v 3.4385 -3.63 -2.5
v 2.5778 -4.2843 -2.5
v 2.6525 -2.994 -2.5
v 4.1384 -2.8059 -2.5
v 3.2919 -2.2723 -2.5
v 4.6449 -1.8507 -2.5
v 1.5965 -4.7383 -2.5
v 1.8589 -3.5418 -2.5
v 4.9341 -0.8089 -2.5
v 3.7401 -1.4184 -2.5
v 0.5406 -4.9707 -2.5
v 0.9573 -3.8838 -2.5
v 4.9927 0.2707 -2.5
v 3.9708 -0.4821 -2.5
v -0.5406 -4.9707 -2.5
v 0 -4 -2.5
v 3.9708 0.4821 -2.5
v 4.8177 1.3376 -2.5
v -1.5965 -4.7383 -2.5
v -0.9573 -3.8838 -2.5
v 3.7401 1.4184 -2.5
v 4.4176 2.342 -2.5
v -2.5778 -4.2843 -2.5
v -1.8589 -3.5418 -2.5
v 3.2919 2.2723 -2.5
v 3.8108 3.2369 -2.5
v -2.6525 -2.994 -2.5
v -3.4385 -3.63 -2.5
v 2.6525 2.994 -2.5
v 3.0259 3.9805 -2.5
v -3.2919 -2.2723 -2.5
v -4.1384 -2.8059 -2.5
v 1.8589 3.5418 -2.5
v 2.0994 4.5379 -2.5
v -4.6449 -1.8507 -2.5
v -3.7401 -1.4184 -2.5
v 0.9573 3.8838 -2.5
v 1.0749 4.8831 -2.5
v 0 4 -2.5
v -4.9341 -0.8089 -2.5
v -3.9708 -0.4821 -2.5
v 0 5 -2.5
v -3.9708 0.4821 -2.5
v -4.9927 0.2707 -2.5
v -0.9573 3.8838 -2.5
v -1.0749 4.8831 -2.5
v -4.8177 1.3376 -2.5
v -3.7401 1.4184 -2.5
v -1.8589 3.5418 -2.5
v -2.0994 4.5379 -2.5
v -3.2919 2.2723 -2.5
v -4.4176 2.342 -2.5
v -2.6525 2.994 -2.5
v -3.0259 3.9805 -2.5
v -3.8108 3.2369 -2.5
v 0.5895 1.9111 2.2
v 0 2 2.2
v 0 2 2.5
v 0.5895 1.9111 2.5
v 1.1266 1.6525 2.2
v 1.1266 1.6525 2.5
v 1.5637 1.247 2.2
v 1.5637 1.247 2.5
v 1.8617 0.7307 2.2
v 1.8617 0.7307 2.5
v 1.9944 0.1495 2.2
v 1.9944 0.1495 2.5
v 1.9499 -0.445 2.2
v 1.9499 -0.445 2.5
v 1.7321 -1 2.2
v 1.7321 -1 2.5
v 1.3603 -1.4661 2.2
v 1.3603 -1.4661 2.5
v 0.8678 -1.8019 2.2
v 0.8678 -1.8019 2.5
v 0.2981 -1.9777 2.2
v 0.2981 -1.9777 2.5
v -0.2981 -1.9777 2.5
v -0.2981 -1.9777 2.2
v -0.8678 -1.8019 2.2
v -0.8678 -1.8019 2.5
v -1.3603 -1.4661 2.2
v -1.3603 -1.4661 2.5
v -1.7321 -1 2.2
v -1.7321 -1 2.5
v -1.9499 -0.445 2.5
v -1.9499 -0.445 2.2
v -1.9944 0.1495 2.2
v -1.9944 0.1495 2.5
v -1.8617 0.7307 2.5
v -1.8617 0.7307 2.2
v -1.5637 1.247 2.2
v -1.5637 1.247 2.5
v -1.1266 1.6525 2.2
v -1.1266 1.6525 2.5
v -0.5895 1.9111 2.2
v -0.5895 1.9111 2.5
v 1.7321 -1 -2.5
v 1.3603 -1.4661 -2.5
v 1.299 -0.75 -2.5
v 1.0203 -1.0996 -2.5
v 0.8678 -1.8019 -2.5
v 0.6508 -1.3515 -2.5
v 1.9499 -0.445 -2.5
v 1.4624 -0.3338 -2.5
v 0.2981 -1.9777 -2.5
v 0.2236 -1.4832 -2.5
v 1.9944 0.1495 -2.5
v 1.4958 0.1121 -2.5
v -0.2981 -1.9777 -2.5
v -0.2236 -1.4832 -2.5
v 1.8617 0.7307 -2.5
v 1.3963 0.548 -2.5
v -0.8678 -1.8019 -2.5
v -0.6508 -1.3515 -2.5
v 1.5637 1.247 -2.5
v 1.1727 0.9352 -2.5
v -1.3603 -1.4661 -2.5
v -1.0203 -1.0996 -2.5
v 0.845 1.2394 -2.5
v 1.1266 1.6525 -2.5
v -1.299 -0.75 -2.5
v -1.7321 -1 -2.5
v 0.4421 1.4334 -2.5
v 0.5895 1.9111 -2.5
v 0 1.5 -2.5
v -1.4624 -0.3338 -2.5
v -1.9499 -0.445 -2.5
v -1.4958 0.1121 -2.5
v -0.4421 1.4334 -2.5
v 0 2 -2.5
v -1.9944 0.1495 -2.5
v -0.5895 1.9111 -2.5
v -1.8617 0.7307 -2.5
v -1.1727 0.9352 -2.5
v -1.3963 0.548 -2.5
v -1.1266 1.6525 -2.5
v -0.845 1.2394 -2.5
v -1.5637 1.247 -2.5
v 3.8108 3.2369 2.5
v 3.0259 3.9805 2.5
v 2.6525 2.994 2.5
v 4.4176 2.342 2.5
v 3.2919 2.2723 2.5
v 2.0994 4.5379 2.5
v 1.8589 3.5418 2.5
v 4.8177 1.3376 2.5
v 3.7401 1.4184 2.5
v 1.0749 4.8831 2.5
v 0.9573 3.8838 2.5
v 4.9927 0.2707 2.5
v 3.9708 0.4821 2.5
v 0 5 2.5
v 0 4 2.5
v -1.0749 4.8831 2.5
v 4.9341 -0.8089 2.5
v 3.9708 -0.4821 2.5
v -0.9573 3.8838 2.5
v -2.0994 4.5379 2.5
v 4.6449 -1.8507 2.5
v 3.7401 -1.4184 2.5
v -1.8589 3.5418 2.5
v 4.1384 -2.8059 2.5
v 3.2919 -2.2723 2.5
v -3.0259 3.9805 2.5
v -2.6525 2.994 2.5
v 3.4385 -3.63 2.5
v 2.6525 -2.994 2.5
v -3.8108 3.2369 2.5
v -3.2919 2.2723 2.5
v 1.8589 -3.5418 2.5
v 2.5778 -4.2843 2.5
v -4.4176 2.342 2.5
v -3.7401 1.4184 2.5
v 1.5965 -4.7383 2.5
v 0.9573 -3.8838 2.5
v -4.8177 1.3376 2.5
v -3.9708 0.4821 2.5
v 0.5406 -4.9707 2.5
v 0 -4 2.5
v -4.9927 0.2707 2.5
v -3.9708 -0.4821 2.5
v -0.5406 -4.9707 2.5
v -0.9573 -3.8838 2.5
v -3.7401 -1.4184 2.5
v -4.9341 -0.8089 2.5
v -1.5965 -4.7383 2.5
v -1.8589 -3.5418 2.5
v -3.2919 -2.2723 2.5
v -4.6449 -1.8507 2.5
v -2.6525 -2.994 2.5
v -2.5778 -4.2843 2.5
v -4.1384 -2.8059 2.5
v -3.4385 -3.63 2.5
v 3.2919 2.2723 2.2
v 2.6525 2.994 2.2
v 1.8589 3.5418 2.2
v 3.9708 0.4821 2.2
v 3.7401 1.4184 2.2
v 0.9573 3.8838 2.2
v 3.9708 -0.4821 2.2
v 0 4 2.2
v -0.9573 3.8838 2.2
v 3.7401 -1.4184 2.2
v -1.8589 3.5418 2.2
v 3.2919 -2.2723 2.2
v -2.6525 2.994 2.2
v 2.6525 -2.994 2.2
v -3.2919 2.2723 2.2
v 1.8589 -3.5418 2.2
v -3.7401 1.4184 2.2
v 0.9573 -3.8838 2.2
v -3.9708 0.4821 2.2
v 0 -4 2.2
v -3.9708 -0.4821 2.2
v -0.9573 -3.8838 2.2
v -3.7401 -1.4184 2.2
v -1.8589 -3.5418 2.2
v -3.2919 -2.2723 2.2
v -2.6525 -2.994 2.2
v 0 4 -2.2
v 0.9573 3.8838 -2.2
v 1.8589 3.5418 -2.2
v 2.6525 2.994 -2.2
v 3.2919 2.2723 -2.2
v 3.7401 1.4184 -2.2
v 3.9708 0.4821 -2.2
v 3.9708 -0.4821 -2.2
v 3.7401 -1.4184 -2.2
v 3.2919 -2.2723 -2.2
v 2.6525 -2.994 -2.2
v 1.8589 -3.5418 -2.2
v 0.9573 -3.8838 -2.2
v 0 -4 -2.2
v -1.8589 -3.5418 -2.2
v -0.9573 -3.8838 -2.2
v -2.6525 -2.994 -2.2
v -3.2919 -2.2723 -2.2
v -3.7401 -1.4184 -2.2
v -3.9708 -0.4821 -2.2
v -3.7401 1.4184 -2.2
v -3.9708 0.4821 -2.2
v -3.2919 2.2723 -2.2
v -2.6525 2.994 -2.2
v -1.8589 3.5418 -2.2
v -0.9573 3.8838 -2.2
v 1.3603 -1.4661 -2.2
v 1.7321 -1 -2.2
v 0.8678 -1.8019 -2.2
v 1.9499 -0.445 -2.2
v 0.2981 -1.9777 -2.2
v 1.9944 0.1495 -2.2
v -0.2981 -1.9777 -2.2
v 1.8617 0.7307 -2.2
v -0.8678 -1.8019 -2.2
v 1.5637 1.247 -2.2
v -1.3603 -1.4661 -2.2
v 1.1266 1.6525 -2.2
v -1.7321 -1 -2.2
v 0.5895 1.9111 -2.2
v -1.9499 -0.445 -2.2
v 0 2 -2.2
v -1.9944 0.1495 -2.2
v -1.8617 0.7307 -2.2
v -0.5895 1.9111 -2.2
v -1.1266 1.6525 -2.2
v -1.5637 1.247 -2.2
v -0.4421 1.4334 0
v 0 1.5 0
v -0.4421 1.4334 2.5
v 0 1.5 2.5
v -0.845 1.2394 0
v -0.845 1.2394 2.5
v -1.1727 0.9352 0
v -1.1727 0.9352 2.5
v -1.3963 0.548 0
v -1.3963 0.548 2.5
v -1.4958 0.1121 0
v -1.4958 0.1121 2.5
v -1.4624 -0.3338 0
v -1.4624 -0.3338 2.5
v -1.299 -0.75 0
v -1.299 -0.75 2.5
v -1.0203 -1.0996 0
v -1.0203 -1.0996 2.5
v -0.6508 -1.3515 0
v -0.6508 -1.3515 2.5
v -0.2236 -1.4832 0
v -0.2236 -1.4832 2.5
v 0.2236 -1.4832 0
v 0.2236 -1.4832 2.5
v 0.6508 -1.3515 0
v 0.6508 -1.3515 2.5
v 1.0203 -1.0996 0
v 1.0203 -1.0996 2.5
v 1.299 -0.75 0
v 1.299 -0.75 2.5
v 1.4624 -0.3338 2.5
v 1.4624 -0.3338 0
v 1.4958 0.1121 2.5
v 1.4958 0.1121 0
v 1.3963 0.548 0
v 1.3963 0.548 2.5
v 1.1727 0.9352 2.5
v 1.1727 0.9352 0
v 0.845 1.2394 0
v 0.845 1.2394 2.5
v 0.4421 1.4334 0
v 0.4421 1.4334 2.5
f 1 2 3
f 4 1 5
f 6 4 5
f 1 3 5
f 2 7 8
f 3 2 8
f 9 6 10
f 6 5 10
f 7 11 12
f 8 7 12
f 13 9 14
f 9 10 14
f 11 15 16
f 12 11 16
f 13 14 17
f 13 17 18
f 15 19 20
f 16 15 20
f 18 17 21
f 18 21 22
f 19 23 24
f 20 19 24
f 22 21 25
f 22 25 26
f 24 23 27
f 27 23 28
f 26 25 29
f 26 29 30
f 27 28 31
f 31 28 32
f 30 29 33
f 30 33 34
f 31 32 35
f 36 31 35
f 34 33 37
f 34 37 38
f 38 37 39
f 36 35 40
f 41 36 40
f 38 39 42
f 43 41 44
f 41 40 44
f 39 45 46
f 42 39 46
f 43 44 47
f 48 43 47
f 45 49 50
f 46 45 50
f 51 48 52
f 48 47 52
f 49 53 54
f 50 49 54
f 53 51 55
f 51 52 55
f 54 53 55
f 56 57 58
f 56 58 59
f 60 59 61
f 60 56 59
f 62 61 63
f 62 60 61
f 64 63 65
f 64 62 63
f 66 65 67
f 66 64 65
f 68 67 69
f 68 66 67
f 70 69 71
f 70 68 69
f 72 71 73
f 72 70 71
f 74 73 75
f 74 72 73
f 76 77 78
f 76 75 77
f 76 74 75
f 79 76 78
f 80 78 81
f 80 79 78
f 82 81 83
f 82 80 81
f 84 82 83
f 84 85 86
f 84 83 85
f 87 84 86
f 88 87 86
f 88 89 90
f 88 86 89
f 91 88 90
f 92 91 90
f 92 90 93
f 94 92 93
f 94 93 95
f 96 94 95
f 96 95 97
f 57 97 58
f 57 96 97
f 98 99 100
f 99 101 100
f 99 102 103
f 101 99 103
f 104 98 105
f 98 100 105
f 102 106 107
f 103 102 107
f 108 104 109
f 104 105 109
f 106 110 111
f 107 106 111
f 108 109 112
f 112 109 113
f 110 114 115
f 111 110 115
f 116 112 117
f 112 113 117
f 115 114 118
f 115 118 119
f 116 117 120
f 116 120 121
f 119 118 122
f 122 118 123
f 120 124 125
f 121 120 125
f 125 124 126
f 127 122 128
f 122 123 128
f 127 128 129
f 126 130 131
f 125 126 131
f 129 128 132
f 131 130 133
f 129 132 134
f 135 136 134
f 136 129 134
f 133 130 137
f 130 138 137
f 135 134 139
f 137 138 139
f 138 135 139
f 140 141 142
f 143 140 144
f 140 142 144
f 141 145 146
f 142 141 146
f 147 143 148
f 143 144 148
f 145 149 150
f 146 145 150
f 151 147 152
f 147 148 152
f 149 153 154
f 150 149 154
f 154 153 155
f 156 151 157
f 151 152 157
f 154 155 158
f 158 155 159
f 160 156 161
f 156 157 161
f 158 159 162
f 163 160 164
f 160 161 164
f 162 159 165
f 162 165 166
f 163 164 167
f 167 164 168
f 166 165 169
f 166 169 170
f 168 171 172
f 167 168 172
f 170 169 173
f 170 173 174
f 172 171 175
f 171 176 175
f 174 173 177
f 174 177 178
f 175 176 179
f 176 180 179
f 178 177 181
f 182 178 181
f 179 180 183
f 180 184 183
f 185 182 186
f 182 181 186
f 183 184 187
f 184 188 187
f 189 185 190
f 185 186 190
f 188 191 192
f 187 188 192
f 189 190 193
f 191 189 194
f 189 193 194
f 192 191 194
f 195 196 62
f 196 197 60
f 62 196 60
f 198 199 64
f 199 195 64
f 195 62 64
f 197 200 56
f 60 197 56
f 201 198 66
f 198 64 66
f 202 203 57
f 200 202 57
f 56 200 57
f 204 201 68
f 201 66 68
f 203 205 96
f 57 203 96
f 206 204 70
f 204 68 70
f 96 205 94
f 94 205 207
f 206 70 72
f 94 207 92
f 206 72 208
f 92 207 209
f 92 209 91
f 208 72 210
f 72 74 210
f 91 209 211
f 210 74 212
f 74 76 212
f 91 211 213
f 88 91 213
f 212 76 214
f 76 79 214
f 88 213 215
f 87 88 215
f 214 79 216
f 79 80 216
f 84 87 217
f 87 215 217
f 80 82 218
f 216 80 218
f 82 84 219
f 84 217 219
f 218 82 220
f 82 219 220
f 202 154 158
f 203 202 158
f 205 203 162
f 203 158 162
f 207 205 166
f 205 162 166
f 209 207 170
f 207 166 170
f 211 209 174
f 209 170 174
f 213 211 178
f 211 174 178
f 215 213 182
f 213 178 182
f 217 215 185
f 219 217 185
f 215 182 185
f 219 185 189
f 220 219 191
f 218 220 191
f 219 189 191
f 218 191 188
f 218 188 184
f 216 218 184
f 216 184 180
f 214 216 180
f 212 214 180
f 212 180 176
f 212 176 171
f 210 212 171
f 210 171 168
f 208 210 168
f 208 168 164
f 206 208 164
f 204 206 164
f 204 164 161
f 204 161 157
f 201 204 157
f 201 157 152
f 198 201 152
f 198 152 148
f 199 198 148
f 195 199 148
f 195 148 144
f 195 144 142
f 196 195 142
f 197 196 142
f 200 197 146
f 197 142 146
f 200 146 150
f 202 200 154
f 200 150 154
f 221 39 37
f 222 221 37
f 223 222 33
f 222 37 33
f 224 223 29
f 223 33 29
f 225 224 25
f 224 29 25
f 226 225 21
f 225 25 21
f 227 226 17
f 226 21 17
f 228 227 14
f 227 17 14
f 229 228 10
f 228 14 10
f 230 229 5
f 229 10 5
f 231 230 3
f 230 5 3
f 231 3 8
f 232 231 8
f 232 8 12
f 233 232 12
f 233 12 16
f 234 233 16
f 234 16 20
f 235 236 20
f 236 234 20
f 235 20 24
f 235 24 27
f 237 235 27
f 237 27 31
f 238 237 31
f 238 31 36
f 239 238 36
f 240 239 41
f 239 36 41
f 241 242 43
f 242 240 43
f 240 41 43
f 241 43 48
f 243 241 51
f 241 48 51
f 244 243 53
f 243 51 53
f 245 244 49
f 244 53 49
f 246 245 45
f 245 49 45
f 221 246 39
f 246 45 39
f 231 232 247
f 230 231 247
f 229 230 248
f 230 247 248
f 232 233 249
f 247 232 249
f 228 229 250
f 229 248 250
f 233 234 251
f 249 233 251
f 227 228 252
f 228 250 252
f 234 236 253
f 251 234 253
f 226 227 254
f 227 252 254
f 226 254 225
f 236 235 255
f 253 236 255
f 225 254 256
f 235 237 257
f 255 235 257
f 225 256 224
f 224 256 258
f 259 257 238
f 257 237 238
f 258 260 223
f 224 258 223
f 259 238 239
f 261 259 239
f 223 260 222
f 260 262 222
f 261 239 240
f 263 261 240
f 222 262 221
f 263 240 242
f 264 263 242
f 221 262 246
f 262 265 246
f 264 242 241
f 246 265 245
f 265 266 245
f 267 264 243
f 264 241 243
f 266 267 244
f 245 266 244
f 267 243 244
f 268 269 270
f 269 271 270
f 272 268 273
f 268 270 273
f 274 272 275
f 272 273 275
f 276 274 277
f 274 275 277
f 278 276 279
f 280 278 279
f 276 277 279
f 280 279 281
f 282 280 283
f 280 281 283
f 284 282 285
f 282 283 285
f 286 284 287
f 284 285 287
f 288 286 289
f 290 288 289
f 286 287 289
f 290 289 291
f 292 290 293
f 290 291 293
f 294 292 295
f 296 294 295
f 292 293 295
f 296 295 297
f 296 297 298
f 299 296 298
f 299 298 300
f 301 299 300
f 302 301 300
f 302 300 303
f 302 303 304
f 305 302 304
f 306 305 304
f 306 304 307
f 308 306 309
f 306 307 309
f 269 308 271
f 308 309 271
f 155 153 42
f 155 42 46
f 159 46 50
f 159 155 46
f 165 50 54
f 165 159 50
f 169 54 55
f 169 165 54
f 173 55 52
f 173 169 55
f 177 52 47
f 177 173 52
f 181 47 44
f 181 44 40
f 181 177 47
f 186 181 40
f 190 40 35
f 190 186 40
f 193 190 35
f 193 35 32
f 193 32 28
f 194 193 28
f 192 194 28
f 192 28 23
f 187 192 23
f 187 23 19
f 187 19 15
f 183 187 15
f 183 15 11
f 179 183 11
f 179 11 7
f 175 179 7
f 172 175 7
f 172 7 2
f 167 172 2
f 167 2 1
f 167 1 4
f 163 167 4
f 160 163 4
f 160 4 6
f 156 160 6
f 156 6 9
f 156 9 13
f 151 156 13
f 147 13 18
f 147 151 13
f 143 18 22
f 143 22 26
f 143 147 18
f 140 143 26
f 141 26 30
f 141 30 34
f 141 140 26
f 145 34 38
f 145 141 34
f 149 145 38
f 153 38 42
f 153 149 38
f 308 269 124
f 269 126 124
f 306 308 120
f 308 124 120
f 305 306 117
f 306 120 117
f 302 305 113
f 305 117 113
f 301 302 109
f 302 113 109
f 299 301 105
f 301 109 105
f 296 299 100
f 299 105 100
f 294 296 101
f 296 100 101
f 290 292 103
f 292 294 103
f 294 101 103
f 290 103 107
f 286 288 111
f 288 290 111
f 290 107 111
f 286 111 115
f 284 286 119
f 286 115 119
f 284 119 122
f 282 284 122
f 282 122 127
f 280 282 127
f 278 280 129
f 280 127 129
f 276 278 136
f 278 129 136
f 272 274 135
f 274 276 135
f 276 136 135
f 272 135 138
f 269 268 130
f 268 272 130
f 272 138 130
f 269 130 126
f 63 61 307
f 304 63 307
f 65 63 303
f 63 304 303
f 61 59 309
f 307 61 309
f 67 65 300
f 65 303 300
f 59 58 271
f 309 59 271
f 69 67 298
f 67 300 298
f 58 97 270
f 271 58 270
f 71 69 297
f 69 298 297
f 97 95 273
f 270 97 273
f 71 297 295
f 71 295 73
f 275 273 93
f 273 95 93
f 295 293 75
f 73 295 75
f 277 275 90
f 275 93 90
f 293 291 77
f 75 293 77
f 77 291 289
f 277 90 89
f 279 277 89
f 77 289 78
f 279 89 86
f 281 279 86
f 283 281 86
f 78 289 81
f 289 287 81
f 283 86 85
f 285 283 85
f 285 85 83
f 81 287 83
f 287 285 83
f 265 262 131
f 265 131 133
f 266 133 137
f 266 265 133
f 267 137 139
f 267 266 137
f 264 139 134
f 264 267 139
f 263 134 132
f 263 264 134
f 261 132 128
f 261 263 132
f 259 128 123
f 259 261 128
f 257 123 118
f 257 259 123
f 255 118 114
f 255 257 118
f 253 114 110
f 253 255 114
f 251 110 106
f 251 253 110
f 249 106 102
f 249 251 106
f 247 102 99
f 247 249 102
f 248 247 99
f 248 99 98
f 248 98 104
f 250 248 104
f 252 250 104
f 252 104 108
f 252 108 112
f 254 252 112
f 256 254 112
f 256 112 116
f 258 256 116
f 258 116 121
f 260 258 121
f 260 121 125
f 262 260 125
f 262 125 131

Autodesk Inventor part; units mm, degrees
ref_plane "YZ Plane" through (0, 0, 0) normal (1, 0, 0) x (0, 1, 0)
ref_plane "XZ Plane" through (0, 0, 0) normal (0, 1, 0) x (-1, 0, 0)
ref_plane "XY Plane" through (0, 0, 0) normal (0, 0, 1) x (1, 0, 0)
sketch "Sketch1" plane through (0, 0, 0) normal (1, 0, 0) x (0, 1, 0)
  line L0 (5, 0) -> (1.5, 0)
  line L1 (1.5, 0) -> (1.5, -2.5)
  line L2 (5, -2.5) -> (5, 0)
  line L3 (-1, 0) -> (6, 0) projected
  line L4 (0, -3) -> (0, 0.5) projected
  line L5 (1.5, -2.5) -> (2, -2.5)
  line L6 (2, -2.5) -> (2, -2.2)
  line L7 (2, -2.2) -> (4, -2.2)
  line L8 (4, -2.2) -> (4, -2.5)
  line L9 (4, -2.5) -> (5, -2.5)
  point P0 (0, 0)
  point P1 (4, -2.35)
  point P2 (2, -2.35)
  dimension "d1" = 5
  dimension "d2" = 1.5
  dimension "d5" = 2.2
  dimension "d6" = 1
  dimension "d7" = 0.5
  dimension "d9" = 2.5
revolve "Revolution1" add sketch "Sketch1" angle 360 about axis through (0, 0, -10) along (0, 0, 1)
mirror "Mirror1" about plane through (0, 0, 0) normal (0, 0, 1) of "Revolution1"
properties part number "Bearing_BS69310-5"
